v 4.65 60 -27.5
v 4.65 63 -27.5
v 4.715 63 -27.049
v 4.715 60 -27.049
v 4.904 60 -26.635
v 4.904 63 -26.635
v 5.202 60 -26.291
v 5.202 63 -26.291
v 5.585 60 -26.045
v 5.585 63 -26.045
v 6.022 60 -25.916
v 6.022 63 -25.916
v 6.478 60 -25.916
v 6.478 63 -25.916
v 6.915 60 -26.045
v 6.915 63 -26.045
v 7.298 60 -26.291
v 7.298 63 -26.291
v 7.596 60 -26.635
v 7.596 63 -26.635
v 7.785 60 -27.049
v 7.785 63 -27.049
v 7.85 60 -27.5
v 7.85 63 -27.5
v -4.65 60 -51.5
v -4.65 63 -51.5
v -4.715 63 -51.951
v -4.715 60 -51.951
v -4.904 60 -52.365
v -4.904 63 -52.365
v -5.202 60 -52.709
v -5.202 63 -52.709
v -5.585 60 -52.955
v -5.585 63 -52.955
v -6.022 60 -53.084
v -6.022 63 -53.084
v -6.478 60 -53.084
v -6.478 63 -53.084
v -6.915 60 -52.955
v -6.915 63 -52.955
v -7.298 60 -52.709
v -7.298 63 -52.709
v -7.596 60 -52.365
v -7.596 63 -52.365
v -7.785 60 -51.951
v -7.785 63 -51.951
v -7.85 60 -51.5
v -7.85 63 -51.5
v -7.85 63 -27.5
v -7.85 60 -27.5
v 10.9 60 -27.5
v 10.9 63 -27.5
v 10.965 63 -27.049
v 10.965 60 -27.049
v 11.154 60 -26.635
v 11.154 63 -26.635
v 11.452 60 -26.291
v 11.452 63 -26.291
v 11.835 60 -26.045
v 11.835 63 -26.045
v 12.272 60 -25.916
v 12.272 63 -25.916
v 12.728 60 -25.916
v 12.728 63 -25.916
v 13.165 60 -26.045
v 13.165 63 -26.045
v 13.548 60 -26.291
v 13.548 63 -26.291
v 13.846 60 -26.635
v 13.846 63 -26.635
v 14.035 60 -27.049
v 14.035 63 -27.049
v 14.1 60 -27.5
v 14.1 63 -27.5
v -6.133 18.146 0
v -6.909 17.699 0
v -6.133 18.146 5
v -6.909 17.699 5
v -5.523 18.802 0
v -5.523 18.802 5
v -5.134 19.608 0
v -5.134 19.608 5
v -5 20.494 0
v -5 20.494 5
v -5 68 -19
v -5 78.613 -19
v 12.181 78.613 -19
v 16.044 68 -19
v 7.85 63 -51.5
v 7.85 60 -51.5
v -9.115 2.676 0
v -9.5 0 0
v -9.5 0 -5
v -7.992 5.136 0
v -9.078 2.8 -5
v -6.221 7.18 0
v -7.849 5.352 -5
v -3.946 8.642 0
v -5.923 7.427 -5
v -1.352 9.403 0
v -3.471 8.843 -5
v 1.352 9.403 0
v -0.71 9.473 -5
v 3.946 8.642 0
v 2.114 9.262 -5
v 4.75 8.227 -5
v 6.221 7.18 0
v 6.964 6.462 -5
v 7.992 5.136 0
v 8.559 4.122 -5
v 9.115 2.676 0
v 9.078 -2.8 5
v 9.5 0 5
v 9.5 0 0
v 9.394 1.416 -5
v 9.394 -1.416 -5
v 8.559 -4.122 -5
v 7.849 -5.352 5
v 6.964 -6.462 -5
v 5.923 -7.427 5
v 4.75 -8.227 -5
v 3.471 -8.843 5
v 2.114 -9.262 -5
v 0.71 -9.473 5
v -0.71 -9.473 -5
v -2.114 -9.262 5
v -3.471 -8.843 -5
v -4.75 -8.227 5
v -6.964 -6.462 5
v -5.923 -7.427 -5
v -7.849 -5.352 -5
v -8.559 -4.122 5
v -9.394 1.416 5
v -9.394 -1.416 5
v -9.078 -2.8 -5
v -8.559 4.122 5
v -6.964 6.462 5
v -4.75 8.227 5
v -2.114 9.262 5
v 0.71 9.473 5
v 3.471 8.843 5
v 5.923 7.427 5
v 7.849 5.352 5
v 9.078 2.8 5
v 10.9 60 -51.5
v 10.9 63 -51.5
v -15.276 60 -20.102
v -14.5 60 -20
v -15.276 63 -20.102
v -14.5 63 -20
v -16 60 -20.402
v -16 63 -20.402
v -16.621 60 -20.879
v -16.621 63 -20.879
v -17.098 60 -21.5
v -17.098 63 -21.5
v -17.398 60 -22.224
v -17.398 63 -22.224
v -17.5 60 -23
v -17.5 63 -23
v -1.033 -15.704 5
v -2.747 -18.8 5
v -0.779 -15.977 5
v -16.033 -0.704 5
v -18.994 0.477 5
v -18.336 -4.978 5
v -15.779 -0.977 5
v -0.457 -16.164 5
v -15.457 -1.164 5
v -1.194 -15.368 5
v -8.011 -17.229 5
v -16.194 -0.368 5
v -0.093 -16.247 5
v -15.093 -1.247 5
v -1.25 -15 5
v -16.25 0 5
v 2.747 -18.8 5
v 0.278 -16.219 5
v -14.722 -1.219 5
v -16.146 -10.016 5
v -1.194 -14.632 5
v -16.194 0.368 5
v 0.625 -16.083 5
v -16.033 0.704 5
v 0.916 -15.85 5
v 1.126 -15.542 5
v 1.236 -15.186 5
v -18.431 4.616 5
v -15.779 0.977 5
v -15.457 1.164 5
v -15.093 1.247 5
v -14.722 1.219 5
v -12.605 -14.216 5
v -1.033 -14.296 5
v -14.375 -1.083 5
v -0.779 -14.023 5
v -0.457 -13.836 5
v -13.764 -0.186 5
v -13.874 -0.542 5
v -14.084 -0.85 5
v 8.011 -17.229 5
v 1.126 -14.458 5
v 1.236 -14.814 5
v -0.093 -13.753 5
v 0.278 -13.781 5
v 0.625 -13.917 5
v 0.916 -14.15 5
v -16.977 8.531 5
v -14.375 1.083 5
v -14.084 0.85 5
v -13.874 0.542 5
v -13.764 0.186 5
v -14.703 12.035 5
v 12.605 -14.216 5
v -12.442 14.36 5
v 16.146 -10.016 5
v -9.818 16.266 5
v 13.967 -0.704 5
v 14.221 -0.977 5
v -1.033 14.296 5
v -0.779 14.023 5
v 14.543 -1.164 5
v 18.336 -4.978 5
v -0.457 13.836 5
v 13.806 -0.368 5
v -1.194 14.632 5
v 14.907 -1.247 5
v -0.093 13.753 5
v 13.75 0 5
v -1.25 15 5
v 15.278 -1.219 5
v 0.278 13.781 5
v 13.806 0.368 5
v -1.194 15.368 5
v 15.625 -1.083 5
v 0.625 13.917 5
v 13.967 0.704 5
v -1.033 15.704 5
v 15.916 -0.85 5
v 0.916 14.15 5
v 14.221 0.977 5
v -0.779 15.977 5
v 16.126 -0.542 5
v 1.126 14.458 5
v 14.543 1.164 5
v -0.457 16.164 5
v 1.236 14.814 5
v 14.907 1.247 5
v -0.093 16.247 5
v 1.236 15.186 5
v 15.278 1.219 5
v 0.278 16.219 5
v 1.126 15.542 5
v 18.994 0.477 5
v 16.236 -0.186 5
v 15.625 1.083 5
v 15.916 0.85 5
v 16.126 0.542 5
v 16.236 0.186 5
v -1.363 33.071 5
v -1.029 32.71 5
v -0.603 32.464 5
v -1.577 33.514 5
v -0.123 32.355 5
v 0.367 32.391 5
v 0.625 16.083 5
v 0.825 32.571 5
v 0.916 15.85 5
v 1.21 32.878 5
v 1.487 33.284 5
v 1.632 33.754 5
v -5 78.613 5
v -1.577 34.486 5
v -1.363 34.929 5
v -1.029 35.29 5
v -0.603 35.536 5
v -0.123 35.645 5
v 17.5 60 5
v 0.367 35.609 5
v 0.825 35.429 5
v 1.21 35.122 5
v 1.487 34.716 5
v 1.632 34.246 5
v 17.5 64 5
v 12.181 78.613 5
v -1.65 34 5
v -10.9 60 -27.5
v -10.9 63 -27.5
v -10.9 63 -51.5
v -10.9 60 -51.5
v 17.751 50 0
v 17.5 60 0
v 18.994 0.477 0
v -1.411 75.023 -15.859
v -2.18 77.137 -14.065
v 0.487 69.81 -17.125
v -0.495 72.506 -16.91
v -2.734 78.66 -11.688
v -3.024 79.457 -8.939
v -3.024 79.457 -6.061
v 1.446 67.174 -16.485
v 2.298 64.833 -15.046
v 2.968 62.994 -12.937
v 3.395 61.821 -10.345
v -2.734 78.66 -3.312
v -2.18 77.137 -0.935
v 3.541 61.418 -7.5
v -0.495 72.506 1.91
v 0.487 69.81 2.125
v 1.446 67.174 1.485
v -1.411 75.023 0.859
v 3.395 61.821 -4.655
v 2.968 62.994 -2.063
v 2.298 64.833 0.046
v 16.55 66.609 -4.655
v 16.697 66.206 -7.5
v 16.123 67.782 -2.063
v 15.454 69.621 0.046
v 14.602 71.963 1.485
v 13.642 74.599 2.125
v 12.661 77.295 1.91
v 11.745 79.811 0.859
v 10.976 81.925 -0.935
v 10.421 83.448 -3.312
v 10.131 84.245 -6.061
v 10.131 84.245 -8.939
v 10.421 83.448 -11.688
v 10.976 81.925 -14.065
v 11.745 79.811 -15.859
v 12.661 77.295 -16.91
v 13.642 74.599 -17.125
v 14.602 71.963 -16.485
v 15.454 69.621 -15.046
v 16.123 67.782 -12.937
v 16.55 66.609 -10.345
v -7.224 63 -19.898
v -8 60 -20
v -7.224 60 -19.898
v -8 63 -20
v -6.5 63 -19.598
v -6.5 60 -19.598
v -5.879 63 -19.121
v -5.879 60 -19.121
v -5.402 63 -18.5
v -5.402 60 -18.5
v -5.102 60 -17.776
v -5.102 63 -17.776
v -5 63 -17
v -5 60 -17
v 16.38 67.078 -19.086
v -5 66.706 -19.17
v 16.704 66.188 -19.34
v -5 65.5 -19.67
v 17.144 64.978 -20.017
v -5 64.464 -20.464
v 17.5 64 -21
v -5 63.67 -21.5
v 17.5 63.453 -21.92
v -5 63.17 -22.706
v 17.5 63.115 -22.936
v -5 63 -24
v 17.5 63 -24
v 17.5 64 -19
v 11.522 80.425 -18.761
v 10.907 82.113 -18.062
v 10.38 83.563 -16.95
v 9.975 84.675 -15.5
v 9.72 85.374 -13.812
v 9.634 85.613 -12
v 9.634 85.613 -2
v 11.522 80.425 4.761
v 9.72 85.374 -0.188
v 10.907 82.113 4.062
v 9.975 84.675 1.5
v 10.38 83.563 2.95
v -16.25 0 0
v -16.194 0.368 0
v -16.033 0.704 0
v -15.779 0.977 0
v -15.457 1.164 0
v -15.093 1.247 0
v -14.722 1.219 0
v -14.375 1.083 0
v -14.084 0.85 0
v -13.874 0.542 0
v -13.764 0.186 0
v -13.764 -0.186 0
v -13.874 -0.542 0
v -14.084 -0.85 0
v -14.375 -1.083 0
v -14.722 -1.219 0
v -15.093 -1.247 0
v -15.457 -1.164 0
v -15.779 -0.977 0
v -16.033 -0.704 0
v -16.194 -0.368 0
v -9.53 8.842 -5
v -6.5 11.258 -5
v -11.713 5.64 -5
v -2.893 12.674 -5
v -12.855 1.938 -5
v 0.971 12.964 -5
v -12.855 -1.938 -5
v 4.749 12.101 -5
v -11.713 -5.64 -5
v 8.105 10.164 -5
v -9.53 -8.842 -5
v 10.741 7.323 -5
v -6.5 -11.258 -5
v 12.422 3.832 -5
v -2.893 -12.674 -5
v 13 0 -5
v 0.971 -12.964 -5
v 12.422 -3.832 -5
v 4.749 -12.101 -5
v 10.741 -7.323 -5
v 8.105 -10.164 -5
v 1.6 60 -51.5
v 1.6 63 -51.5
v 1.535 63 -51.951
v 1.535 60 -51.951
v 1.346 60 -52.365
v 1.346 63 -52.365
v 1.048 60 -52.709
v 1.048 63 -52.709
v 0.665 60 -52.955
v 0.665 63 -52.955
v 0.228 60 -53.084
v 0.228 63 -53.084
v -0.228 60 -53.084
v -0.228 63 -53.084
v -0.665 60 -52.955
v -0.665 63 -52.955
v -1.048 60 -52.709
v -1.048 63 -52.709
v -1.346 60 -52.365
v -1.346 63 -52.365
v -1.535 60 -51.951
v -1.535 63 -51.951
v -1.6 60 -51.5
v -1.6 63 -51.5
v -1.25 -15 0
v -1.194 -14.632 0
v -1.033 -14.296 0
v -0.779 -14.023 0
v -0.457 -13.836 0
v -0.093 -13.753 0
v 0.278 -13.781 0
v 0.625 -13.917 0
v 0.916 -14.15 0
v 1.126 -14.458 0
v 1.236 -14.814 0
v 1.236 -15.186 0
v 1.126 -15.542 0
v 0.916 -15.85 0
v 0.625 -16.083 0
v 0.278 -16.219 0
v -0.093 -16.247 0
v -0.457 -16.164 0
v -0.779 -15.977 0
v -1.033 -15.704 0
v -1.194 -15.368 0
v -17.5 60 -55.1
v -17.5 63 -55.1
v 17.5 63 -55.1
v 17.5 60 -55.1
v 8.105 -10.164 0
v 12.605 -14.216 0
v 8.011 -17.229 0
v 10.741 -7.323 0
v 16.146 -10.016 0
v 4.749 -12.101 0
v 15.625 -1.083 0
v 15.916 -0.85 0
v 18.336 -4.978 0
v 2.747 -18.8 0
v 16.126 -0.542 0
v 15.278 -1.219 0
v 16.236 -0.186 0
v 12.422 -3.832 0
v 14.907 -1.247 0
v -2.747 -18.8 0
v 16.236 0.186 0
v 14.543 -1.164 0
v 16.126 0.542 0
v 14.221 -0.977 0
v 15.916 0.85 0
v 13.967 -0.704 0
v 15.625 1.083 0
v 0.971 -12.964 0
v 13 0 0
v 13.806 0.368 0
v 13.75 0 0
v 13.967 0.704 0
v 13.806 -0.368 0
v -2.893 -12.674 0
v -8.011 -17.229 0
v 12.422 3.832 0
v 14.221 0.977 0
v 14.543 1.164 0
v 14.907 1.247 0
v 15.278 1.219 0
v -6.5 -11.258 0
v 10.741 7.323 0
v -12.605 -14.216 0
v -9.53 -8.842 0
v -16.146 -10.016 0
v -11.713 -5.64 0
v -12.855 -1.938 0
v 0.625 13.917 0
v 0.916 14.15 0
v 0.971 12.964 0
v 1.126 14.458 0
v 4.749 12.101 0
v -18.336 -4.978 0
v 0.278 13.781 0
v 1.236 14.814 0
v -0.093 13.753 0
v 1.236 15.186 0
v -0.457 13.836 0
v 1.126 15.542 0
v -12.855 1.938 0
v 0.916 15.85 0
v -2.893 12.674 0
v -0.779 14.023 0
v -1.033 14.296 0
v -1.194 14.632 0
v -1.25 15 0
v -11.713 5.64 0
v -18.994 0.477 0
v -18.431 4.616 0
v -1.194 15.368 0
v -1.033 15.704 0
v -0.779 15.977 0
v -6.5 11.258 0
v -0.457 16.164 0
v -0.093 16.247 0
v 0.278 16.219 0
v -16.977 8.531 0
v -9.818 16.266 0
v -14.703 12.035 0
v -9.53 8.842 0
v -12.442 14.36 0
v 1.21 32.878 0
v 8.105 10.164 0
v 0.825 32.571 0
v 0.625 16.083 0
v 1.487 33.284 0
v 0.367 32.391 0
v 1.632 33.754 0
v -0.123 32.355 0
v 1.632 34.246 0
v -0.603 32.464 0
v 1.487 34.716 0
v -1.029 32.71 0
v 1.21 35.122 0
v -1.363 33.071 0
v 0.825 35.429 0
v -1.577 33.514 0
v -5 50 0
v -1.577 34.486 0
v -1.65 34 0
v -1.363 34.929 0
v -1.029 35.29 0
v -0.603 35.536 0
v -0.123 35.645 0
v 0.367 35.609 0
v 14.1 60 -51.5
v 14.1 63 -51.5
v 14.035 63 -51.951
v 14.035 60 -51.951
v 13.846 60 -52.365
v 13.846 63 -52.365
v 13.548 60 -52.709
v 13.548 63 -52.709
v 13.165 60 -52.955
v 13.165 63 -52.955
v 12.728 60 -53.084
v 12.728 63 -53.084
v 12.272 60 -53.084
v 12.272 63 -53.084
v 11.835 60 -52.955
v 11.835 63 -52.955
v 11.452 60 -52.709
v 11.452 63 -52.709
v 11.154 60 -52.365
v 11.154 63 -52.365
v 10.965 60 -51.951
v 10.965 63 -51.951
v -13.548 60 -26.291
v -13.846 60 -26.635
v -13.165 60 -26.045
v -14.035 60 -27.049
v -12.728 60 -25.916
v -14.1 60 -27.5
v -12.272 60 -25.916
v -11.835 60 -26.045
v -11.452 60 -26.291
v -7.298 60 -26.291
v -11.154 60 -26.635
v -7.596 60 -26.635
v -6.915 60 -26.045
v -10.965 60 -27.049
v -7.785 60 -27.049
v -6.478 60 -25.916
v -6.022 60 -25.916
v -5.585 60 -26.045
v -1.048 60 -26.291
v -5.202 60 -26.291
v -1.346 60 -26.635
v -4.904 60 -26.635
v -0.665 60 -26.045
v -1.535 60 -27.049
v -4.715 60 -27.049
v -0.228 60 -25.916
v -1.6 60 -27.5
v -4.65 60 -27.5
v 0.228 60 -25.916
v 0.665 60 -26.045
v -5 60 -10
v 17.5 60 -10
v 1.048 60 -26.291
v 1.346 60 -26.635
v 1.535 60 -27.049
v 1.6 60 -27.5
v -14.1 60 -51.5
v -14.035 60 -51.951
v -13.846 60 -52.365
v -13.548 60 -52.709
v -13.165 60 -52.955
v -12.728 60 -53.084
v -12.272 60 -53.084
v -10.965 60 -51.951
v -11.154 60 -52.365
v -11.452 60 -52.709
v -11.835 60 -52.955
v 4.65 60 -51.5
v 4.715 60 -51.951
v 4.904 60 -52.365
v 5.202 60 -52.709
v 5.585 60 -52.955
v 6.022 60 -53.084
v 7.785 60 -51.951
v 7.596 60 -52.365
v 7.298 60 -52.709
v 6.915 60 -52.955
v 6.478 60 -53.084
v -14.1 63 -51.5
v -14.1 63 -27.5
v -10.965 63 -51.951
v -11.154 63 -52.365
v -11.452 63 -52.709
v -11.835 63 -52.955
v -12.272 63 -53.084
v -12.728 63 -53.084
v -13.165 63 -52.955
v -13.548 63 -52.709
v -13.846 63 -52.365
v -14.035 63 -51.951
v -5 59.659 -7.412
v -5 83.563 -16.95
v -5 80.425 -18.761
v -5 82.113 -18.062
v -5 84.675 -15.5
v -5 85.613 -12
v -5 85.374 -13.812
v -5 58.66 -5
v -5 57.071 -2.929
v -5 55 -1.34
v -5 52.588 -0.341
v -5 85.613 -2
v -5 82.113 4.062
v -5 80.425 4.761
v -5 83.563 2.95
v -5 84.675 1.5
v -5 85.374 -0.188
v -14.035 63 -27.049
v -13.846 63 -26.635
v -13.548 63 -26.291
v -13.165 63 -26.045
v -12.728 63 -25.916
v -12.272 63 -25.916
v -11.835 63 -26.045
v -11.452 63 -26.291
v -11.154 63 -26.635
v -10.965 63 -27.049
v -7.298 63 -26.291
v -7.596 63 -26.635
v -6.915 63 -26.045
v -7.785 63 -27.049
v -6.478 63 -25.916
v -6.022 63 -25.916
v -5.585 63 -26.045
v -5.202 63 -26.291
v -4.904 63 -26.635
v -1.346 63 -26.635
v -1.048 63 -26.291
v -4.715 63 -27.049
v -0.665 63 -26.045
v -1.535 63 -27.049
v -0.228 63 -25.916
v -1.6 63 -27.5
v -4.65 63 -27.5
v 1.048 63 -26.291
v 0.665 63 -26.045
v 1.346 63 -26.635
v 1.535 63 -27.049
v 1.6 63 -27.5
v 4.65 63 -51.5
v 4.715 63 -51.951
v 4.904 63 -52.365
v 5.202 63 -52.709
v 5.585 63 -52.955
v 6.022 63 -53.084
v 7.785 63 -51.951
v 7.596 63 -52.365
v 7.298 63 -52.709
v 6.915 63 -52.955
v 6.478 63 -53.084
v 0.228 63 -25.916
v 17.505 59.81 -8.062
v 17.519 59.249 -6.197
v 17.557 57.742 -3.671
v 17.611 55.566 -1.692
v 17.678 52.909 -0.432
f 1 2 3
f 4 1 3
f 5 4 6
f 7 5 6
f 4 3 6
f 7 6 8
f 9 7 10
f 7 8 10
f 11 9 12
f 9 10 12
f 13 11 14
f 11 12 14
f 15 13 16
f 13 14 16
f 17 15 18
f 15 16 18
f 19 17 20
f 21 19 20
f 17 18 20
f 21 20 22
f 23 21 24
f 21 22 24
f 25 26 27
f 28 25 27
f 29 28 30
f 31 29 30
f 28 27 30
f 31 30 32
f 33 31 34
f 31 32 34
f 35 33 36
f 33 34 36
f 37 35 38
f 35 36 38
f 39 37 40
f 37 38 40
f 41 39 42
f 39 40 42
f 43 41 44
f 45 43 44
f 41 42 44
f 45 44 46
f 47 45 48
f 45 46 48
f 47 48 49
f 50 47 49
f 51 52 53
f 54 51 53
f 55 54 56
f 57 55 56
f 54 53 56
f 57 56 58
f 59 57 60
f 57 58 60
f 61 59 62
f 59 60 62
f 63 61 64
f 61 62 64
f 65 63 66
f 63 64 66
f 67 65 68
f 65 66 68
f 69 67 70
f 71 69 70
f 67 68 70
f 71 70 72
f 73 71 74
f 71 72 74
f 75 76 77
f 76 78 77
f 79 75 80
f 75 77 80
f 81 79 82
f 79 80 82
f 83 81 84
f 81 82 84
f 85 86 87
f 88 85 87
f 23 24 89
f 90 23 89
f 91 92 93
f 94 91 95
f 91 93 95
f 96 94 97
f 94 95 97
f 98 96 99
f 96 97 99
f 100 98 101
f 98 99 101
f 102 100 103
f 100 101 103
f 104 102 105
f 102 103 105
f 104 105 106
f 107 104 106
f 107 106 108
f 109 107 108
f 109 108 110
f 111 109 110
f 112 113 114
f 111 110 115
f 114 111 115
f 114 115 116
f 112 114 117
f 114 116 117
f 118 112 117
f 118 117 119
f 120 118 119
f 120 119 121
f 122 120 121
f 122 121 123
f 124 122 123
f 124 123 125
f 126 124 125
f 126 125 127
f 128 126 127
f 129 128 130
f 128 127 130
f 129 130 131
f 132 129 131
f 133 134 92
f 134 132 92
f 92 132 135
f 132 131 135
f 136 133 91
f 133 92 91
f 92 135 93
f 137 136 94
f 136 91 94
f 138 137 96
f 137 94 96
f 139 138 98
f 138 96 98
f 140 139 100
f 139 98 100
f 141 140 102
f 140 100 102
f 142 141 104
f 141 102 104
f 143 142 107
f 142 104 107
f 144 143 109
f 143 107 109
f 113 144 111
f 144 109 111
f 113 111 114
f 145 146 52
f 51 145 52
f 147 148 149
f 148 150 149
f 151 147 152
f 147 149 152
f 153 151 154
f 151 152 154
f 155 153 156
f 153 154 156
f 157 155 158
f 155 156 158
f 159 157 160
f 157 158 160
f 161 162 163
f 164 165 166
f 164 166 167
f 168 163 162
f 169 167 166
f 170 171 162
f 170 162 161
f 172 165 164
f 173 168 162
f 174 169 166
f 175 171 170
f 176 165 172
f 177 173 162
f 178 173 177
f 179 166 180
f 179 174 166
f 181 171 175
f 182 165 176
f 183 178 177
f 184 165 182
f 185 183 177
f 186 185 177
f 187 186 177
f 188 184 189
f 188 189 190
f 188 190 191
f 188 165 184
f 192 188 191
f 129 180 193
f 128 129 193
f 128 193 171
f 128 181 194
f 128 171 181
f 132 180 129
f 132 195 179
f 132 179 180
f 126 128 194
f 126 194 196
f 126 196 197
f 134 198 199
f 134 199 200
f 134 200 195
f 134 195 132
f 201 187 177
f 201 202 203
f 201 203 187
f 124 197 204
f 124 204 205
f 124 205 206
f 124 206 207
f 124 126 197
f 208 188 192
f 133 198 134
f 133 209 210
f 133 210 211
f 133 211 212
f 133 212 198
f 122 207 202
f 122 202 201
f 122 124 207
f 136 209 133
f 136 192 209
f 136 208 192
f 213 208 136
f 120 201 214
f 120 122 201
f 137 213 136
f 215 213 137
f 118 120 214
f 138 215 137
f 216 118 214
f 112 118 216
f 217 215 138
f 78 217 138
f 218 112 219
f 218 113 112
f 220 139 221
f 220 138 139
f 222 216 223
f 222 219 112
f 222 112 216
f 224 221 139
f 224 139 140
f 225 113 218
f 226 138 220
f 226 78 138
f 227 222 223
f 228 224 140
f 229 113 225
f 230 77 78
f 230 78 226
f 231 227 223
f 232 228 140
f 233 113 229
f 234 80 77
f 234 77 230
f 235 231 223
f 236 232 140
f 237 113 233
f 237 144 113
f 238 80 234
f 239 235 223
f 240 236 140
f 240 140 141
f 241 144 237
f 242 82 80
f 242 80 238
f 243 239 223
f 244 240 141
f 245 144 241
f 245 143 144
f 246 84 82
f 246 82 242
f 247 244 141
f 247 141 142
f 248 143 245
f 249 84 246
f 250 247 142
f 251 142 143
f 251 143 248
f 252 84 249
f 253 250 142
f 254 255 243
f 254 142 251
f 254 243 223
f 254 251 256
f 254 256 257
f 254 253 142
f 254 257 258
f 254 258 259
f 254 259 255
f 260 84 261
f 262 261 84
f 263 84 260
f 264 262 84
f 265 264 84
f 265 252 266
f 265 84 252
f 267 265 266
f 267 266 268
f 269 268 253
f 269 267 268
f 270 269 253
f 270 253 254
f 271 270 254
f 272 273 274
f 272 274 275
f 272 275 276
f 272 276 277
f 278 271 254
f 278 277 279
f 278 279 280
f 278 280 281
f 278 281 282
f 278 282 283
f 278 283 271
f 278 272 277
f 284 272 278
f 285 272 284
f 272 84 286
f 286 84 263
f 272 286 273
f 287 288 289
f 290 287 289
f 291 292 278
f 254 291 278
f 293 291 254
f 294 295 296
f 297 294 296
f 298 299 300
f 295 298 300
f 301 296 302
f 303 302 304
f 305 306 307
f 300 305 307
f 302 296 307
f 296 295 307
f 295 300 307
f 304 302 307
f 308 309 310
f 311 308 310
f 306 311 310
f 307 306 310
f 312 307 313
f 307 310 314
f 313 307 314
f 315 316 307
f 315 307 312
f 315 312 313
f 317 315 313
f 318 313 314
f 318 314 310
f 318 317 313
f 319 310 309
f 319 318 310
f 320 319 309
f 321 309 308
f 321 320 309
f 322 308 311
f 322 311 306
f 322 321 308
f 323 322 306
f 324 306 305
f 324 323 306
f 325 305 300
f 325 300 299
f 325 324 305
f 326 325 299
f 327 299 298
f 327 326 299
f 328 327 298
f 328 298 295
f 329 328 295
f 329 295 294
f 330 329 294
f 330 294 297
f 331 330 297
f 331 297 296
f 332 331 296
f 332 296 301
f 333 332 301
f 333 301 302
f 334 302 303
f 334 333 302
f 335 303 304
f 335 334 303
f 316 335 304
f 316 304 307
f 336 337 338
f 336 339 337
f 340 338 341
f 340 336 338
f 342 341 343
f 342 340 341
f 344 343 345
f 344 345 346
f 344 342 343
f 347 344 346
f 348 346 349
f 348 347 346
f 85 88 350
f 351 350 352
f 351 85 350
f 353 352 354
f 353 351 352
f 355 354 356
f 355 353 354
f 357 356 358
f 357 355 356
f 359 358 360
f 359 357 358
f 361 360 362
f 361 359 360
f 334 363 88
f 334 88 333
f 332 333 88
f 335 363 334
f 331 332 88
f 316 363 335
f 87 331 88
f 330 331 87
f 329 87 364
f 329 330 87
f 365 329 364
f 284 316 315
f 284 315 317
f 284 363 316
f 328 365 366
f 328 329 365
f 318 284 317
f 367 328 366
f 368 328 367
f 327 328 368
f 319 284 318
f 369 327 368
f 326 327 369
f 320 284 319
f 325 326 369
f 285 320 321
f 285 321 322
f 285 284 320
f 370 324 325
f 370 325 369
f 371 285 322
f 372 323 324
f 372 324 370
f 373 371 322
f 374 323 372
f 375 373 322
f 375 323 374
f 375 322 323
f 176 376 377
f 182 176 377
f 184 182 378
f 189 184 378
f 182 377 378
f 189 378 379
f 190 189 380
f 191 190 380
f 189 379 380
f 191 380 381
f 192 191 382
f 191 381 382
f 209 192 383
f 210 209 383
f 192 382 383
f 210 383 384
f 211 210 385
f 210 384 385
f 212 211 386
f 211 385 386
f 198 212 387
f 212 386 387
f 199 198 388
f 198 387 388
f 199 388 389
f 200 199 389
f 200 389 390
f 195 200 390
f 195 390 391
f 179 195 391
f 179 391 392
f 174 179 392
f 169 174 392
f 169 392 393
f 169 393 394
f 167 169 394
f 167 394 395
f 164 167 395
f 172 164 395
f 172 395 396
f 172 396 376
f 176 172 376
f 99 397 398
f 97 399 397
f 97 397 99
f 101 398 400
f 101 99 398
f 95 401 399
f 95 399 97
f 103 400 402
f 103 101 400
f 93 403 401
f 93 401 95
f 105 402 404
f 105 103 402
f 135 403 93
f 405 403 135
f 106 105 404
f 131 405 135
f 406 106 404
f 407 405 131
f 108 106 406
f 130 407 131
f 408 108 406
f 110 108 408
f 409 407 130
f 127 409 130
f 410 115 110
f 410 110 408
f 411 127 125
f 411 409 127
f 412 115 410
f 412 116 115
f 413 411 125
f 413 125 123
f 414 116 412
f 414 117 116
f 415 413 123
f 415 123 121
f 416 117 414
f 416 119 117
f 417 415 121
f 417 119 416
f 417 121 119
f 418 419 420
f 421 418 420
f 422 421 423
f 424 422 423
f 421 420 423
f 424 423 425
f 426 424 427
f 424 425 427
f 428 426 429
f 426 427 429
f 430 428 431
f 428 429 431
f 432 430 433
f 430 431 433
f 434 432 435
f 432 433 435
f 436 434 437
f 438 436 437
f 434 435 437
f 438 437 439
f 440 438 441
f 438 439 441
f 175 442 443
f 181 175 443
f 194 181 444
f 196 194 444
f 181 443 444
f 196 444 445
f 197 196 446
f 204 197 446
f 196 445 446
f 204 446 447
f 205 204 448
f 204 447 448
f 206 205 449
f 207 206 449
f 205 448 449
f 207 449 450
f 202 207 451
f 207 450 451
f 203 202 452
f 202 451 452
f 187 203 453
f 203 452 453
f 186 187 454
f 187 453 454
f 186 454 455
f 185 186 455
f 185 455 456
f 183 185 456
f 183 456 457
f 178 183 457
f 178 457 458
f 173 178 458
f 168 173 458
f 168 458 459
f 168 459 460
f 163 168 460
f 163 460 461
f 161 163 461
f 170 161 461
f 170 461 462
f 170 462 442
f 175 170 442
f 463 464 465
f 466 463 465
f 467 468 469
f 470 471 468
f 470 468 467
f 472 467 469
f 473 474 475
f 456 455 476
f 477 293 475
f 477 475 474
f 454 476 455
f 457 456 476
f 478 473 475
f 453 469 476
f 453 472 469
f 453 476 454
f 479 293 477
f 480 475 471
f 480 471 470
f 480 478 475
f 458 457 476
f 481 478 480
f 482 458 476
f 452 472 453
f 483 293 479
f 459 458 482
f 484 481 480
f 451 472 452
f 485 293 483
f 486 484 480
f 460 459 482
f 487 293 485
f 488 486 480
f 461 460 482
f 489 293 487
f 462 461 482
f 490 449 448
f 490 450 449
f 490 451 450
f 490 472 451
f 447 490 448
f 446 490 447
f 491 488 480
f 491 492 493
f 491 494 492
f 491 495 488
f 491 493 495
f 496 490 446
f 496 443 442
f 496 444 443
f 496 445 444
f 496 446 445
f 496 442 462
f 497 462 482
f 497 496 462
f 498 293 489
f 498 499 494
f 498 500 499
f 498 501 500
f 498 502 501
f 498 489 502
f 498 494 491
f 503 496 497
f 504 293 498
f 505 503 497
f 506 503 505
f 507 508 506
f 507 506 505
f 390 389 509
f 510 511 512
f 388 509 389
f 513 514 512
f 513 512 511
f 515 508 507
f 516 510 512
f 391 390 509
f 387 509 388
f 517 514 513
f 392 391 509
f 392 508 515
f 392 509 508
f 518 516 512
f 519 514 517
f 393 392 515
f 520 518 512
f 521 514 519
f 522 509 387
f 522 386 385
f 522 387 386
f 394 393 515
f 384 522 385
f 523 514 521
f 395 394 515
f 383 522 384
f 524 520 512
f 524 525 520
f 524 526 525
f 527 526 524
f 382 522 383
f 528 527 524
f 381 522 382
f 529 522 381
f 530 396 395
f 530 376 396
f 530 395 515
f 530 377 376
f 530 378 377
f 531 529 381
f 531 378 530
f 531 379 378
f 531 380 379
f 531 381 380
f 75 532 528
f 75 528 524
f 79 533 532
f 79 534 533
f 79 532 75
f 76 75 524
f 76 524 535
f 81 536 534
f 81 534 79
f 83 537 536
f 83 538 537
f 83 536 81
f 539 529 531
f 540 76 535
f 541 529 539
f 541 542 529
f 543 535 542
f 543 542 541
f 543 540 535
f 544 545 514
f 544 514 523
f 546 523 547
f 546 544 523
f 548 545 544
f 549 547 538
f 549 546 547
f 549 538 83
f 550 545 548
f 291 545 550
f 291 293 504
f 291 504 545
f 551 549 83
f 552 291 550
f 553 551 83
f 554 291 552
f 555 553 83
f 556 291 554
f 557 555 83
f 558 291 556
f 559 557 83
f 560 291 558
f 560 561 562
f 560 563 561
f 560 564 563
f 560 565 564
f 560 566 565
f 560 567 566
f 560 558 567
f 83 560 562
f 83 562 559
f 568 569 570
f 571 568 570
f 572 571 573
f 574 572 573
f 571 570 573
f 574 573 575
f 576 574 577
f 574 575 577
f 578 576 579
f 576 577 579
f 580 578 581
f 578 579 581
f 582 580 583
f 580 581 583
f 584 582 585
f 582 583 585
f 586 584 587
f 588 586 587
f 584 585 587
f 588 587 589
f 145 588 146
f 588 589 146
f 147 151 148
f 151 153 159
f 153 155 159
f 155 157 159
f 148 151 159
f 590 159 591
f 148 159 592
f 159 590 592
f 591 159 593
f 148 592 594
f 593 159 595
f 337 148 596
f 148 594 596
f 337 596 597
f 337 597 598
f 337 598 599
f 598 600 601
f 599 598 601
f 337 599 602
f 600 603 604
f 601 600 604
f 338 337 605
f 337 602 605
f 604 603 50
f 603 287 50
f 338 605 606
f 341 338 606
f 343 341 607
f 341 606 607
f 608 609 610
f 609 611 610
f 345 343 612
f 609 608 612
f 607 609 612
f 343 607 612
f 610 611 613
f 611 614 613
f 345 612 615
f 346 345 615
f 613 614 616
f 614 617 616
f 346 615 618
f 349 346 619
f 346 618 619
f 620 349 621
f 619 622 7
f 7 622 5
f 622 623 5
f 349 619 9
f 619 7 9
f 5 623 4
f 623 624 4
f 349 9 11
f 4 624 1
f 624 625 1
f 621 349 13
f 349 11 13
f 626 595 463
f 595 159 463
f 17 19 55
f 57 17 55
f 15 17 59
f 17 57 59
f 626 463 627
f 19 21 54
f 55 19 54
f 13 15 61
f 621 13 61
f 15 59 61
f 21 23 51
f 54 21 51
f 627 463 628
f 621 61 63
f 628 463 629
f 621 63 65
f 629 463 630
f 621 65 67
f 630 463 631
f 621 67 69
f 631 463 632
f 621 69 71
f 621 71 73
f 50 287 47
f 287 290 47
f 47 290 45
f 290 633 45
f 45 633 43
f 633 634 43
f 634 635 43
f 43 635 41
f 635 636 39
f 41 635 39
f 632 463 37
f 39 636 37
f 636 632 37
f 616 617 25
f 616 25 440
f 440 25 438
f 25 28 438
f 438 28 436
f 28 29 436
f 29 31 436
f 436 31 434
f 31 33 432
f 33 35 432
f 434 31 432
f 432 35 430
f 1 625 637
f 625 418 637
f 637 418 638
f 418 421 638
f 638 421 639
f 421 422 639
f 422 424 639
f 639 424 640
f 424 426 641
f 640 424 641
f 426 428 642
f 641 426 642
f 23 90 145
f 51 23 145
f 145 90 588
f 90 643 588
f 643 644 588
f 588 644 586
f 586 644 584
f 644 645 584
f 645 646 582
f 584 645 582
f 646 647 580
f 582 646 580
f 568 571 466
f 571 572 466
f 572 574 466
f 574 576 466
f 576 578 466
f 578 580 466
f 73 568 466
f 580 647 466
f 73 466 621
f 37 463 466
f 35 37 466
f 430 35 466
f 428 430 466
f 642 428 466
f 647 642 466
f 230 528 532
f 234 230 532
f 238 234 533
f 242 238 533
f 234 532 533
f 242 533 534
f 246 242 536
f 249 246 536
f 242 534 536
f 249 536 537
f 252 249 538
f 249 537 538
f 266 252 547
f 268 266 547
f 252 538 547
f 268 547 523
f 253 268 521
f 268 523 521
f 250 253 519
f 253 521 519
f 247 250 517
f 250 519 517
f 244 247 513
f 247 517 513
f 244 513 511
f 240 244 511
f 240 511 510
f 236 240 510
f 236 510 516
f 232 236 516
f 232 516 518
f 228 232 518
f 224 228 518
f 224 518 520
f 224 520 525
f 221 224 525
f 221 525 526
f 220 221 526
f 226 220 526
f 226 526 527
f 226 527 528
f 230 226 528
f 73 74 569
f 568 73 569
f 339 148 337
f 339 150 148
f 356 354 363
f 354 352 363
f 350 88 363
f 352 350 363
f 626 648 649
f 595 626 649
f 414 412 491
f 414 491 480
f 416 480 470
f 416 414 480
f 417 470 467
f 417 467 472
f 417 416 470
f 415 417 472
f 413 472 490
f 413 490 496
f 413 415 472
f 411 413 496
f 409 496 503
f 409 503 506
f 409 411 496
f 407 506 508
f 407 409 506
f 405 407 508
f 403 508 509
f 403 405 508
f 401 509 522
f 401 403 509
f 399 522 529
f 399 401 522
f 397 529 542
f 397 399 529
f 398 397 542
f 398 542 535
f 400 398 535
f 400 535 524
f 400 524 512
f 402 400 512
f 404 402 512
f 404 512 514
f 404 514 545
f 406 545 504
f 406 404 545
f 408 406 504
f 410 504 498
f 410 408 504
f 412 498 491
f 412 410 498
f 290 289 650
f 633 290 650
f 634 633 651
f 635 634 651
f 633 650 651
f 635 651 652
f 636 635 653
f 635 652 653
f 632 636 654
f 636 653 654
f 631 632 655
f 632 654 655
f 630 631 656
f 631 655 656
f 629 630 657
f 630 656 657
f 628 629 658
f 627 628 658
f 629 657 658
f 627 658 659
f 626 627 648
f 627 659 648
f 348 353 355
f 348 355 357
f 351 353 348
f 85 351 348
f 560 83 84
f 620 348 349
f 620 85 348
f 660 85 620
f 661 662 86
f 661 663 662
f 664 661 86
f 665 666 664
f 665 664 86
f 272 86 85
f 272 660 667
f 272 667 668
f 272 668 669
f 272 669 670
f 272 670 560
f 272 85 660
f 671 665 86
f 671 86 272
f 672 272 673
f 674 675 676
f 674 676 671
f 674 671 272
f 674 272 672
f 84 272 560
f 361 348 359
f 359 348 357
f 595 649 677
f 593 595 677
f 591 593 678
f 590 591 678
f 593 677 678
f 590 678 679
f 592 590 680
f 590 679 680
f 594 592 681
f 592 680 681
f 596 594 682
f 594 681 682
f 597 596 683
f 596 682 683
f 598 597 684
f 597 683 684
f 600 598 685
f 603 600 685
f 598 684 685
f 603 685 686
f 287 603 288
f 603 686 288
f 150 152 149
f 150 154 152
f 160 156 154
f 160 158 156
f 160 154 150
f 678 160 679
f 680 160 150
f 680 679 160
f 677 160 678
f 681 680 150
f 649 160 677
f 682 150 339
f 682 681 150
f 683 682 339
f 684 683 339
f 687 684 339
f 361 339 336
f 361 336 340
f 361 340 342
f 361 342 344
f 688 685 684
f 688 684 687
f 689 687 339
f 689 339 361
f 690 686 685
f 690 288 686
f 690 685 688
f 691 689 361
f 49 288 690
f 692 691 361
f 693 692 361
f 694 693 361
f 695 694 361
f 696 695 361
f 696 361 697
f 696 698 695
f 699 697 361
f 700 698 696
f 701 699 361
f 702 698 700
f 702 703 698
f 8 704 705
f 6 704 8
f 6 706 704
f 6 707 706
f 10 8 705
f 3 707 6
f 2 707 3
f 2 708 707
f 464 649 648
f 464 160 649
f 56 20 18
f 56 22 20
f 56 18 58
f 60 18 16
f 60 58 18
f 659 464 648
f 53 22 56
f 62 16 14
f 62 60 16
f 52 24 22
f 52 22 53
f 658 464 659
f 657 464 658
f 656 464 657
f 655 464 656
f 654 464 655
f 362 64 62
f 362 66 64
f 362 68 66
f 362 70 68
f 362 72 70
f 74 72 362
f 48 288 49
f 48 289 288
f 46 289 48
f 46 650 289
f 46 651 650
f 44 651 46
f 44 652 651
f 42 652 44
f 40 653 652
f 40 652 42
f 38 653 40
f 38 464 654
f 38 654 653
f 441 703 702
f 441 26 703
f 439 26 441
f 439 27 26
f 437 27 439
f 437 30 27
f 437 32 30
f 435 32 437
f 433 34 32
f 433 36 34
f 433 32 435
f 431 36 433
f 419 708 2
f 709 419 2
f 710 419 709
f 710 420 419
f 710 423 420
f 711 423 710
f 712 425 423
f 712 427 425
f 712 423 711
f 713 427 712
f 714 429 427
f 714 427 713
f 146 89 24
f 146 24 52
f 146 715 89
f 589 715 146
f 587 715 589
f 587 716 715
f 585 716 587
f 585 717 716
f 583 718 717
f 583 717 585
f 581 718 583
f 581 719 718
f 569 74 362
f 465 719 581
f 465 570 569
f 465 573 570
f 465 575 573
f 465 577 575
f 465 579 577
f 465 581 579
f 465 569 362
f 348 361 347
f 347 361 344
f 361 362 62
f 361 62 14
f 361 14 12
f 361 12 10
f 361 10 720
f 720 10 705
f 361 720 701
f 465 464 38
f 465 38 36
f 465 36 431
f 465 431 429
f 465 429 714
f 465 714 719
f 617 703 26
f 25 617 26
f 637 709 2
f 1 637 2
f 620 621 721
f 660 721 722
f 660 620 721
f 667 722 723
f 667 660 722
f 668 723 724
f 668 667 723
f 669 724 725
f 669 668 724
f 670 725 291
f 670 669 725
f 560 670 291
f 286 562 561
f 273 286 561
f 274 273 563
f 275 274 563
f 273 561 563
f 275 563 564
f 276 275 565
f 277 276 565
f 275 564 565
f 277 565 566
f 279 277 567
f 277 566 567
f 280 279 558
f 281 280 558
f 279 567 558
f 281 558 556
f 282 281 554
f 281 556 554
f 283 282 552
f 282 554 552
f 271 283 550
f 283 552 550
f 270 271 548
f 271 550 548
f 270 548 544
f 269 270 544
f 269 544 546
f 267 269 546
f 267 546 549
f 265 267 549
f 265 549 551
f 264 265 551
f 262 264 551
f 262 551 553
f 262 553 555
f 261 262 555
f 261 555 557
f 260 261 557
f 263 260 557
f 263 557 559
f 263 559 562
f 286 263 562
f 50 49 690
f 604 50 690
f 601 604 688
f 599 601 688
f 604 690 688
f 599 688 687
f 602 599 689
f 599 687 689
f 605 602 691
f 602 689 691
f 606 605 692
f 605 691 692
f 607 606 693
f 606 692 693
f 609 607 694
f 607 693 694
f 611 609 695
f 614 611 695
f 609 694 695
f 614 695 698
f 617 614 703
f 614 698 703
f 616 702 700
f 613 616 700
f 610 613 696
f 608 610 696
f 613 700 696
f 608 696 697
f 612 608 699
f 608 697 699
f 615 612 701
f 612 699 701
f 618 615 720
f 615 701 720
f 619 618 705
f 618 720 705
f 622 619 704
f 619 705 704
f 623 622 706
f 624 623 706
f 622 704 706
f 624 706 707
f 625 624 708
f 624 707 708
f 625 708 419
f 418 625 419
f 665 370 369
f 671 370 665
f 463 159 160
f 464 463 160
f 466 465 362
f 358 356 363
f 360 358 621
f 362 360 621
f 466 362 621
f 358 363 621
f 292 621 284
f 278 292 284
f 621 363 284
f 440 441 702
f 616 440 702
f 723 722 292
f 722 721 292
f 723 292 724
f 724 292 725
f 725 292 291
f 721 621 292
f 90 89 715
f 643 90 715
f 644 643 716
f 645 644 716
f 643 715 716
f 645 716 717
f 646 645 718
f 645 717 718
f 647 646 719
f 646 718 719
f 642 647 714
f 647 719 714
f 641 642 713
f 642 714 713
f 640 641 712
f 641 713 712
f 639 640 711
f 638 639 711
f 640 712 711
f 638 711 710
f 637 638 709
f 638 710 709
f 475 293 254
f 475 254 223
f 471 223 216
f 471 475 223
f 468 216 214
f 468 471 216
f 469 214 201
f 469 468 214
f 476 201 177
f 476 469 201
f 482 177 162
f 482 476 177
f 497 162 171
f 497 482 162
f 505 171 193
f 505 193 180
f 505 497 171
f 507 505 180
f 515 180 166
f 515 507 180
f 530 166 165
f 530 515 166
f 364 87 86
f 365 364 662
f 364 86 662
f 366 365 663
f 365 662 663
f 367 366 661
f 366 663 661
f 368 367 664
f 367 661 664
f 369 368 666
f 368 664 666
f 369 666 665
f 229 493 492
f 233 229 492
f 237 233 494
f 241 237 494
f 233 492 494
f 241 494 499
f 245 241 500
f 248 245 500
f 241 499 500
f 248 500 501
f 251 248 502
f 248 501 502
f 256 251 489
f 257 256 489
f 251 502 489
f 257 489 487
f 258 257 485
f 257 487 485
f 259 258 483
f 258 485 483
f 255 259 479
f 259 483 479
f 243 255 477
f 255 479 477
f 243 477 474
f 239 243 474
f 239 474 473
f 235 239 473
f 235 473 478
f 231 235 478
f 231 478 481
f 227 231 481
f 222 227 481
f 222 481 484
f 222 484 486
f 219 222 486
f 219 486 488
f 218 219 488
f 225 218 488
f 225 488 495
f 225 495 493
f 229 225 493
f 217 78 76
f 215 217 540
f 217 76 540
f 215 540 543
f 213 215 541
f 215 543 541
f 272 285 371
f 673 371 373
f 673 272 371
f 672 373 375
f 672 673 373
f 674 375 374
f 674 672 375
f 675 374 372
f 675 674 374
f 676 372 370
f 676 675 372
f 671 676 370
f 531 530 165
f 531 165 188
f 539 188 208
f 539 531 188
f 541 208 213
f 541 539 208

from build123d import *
from build123d.topology import SkipClean

# Parameters (mm, degrees)
SKETCH2_R                 = 9.5
BOSS_EXTRUDE1_DEPTH       = 5
SKETCH3_W                 = 35
SKETCH3_H                 = 85.128
BOSS_EXTRUDE2_DEPTH       = 3
BOSS_EXTRUDE3_START       = 5
SKETCH4_R                 = 13
SKETCH4_R_2               = 9.5
BOSS_EXTRUDE3_DEPTH       = 5
SKETCH5_W                 = 35
SKETCH5_H                 = 9
BOSS_EXTRUDE4_DEPTH       = 3
M3X0_5_TAPPED_HOLE1_D     = 2.5
M3X0_5_TAPPED_HOLE1_DEPTH = 3
BOSS_EXTRUDE5_DEPTH       = 24
SKETCH11_R                = 9.652
CUT_EXTRUDE1_DEPTH        = 14
CUT_EXTRUDE2_START        = -5
CUT_EXTRUDE2_DEPTH        = 5
CUT_EXTRUDE4_DEPTH        = 3
SKETCH15_W                = 35
SKETCH15_H                = 25.028
CUT_EXTRUDE5_DEPTH        = 12
M3X0_5_TAPPED_HOLE2_D     = 2.5
M3X0_5_TAPPED_HOLE2_DEPTH = 6.5
M3X0_5_TAPPED_HOLE2_TIP   = 0.751075774
FILLET7_R                 = 7
BOSS_EXTRUDE6_START       = -5
BOSS_EXTRUDE6_DEPTH       = 5
FILLET3_R                 = 5
CUT_EXTRUDE6_START        = -25
CUT_EXTRUDE6_DEPTH        = 25
FILLET5_R                 = 10
FILLET4_R                 = 3
M4X0_7_TAPPED_HOLE1_D     = 3.3


with BuildPart() as part:
    # Sketch2 → Boss-Extrude1 (new body)
    with BuildSketch(Plane.XY):
        with BuildLine():
            Line((-18.994017858, 0.476744791), (-17.5, 60))
            Line((-17.5, 60), (17.5, 60))
            Line((17.5, 60), (18.994017858, 0.476744791))
            ThreePointArc((18.994017858, 0.476744791), (0, -19), (-18.994017858, 0.476744791))
        make_face()
        Circle(SKETCH2_R, mode=Mode.SUBTRACT)
    extrude(amount=BOSS_EXTRUDE1_DEPTH)

    # Sketch3 → Boss-Extrude2 (add)
    with BuildSketch(Plane(origin=(0, 60, 0), x_dir=(1, 0, 0), z_dir=(0, 1, 0))):
        with Locations((0, 37.564)):
            Rectangle(SKETCH3_W, SKETCH3_H)
    extrude(amount=BOSS_EXTRUDE2_DEPTH)

    # Sketch4 → Boss-Extrude3 (add)
    with SkipClean():  # the faces are left unmerged after this step: merging them gives an invalid solid
        with BuildSketch(Plane(origin=(0, 0, 0), x_dir=(-1, 0, 0), z_dir=(0, 0, -1)).offset(BOSS_EXTRUDE3_START)):
            with Locations(Location((0, 0, 0), (0, 0, 180))):
                Circle(SKETCH4_R)
            Circle(SKETCH4_R_2, mode=Mode.SUBTRACT)
        extrude(amount=-BOSS_EXTRUDE3_DEPTH)

    # Sketch5 → Boss-Extrude4 (add)
    with SkipClean():  # the faces are left unmerged after this step: merging them gives an invalid solid
        with BuildSketch(Plane(origin=(0, 0, -80.128), x_dir=(-1, 0, 0), z_dir=(0, 0, -1))):
            with Locations((0, 55.5)):
                Rectangle(SKETCH5_W, SKETCH5_H)
        extrude(amount=-BOSS_EXTRUDE4_DEPTH)

    # M3x0.5 Tapped Hole1
    with Locations(Plane(origin=(0, 0, -80.128), x_dir=(1, 0, 0), z_dir=(0, 0, -1))):
        with Locations((12, -55.5), (0, -55.5), (-12, -55.5)):
            Hole(M3X0_5_TAPPED_HOLE1_D / 2, depth=M3X0_5_TAPPED_HOLE1_DEPTH)

    # Sketch10 → Boss-Extrude5 (add)
    with SkipClean():  # the faces are left unmerged after this step: merging them gives an invalid solid
        with BuildSketch(Plane.XY.offset(5)):
            Polygon((-5, 85.612930278), (-5, 63), (17.5, 63), (17.5, 64), (9.633536704, 85.612930278), align=None)
        extrude(amount=-BOSS_EXTRUDE5_DEPTH)

    # Sketch11 → Cut-Extrude1 (cut)
    with SkipClean():  # the faces are left unmerged after this step: merging them gives an invalid solid
        with BuildSketch(Plane(origin=(-1.821352029, 117.084978414, 0), x_dir=(0, 0, -1), z_dir=(-0.9396926207859069, -0.34202014332567293, 0))):
            with Locations(Location((7.5, 44.49185408, 0), (0, 0, 90))):
                Circle(SKETCH11_R)
        extrude(amount=CUT_EXTRUDE1_DEPTH, mode=Mode.SUBTRACT)

    # Sketch12 → Cut-Extrude2 (cut)
    with SkipClean():  # the faces are left unmerged after this step: merging them gives an invalid solid
        with BuildSketch(Plane.XY.offset(5).offset(CUT_EXTRUDE2_START)):
            with BuildLine():
                Line((-13.548939673, 58), (13.548939673, 58))
                Line((13.548939673, 58), (14.702658736, 12.034609511))
                ThreePointArc((14.702658736, 12.034609511), (0, 19), (-14.702658736, 12.034609511))
                Line((-14.702658736, 12.034609511), (-13.548939673, 58))
            make_face()
        extrude(amount=CUT_EXTRUDE2_DEPTH, mode=Mode.SUBTRACT)

    # Sketch14 → Cut-Extrude4 (cut)
    with SkipClean():  # the faces are left unmerged after this step: merging them gives an invalid solid
        with BuildSketch(Plane(origin=(0, 63, 0), x_dir=(1, 0, 0), z_dir=(0, 1, 0))):
            with BuildLine():
                Line((-14.1, 51.5), (-14.1, 27.5))
                ThreePointArc((-14.1, 27.5), (-12.5, 25.9), (-10.9, 27.5))
                Line((-10.9, 27.5), (-10.9, 51.5))
                ThreePointArc((-10.9, 51.5), (-12.5, 53.1), (-14.1, 51.5))
            make_face()
            with BuildLine():
                Line((-1.6, 51.5), (-1.6, 27.5))
                ThreePointArc((-1.6, 27.5), (0, 25.9), (1.6, 27.5))
                Line((1.6, 27.5), (1.6, 51.5))
                ThreePointArc((1.6, 51.5), (0, 53.1), (-1.6, 51.5))
            make_face()
            with BuildLine():
                Line((10.9, 51.5), (10.9, 27.5))
                ThreePointArc((10.9, 27.5), (12.5, 25.9), (14.1, 27.5))
                Line((14.1, 27.5), (14.1, 51.5))
                ThreePointArc((14.1, 51.5), (12.5, 53.1), (10.9, 51.5))
            make_face()
            with BuildLine():
                Line((-7.85, 51.5), (-7.85, 27.5))
                ThreePointArc((-7.85, 27.5), (-6.25, 25.9), (-4.65, 27.5))
                Line((-4.65, 27.5), (-4.65, 51.5))
                ThreePointArc((-4.65, 51.5), (-6.25, 53.1), (-7.85, 51.5))
            make_face()
            with BuildLine():
                Line((4.65, 51.5), (4.65, 27.5))
                ThreePointArc((4.65, 27.5), (6.25, 25.9), (7.85, 27.5))
                Line((7.85, 27.5), (7.85, 51.5))
                ThreePointArc((7.85, 51.5), (6.25, 53.1), (4.65, 51.5))
            make_face()
        extrude(amount=-CUT_EXTRUDE4_DEPTH, mode=Mode.SUBTRACT)

    # Sketch15 → Cut-Extrude5 (cut)
    with SkipClean():  # the faces are left unmerged after this step: merging them gives an invalid solid
        with BuildSketch(Plane(origin=(0, 63, 0), x_dir=(1, 0, 0), z_dir=(0, 1, 0))):
            with Locations((0, 67.614)):
                Rectangle(SKETCH15_W, SKETCH15_H)
        extrude(amount=-CUT_EXTRUDE5_DEPTH, mode=Mode.SUBTRACT)

    # M3x0.5 Tapped Hole2
    with Locations(Plane.XY.offset(5)):
        with Locations((0, 15), (15, 0), (0, -15), (-15, 0)):
            Hole(M3X0_5_TAPPED_HOLE2_D / 2, depth=M3X0_5_TAPPED_HOLE2_DEPTH)
            with Locations((0, 0, -(M3X0_5_TAPPED_HOLE2_DEPTH + M3X0_5_TAPPED_HOLE2_TIP / 2))):  # 118° drill point
                Cone(0, M3X0_5_TAPPED_HOLE2_D / 2, M3X0_5_TAPPED_HOLE2_TIP, mode=Mode.SUBTRACT)

    # Fillet7
    fillet7_edges = [part.edges().sort_by_distance(p)[0] for p in [
        (2.316768352, 85.612930278, 5),
        (2.316768352, 85.612930278, -19),
    ]]
    fillet(fillet7_edges, radius=FILLET7_R)

    # Sketch22 → Boss-Extrude6 (add)
    with SkipClean():  # the faces are left unmerged after this step: merging them gives an invalid solid
        with BuildSketch(Plane.XY.offset(5).offset(BOSS_EXTRUDE6_START)):
            with BuildLine():
                Line((-5, 58), (-5, 18.33030278))
                ThreePointArc((-5, 18.33030278), (5.783107735, 18.098498969), (14.702658736, 12.034609511))
                Line((14.702658736, 12.034609511), (13.548939673, 58))
                Line((13.548939673, 58), (-5, 58))
            make_face()
        extrude(amount=BOSS_EXTRUDE6_DEPTH)

    # Fillet3
    # the kernel refuses this fillet: 5 mm, written as the material it adds along each edge
    with BuildSketch(Plane(origin=(-5, 63, -19), x_dir=(0, 1, 0), z_dir=(1, 0, 0))) as fillet3_piece_1_section:
        with BuildLine():
            CenterArc((FILLET3_R, -FILLET3_R), FILLET3_R, 90, 90)
            Line((0, -FILLET3_R), (0, 0))
            Line((0, 0), (FILLET3_R, 0))
        make_face()
    fillet3_piece_1 = extrude(amount=22.5, mode=Mode.PRIVATE)
    fillet3_piece_1 = split(fillet3_piece_1, bisect_by=Plane(origin=(16.135828419, 67.748030616, -20.138902613), z_dir=(-0.9396926207859069, -0.34202014332567293, 0)), keep=Keep.TOP, mode=Mode.PRIVATE)
    add(fillet3_piece_1)

    # Sketch25 → Cut-Extrude6 (cut)
    with SkipClean():  # the faces are left unmerged after this step: merging them gives an invalid solid
        with BuildSketch(Plane.XY.offset(5).offset(CUT_EXTRUDE6_START)):
            with BuildLine():
                Line((-5, 63), (-17.5, 63))
                Line((-17.5, 63), (-18.994017858, 0.476744791))
                ThreePointArc((-18.994017858, 0.476744791), (-14.953782346, 11.721108887), (-5, 18.33030278))
                Line((-5, 18.33030278), (-5, 63))
            make_face()
        extrude(amount=CUT_EXTRUDE6_DEPTH, mode=Mode.SUBTRACT)

    # Fillet5
    # the kernel refuses this fillet: 10 mm, written as the material it adds along each edge
    with BuildSketch(Plane(origin=(-5, 60, 0), x_dir=(0, 0, -1), z_dir=(1, 0, 0))) as fillet5_piece_1:
        with BuildLine():
            CenterArc((FILLET5_R, -FILLET5_R), FILLET5_R, 90, 90)
            Line((0, -FILLET5_R), (0, 0))
            Line((0, 0), (FILLET5_R, 0))
        make_face()
    extrude(amount=22.5)
    with BuildSketch(Plane(origin=(-5, 60, 0), x_dir=(0, 0, -1), z_dir=(1, 0, 0))) as fillet5_piece_2_section:
        with BuildLine():
            CenterArc((FILLET5_R, -FILLET5_R), FILLET5_R, 90, 90)
            Line((0, -FILLET5_R), (0, 0))
            Line((0, 0), (FILLET5_R, 0))
        make_face()
    fillet5_piece_2 = extrude(amount=47.5, mode=Mode.PRIVATE)
    fillet5_piece_2 = split(fillet5_piece_2, bisect_by=Plane(origin=(17.5, 55.698819483, -1.064725127), z_dir=(1, 0, 0)), keep=Keep.TOP, mode=Mode.PRIVATE)
    fillet5_piece_2 = split(fillet5_piece_2, bisect_by=Plane(origin=(17.607924501, 55.700173495, -1.064725127), z_dir=(-0.9996851504403609, -0.0250918311215615, 0)), keep=Keep.TOP, mode=Mode.PRIVATE)
    add(fillet5_piece_2)

    # Fillet4
    fillet4_edges = [part.edges().sort_by_distance(p)[0] for p in [
        (-5, 18.33030278, 2.5),
        (-17.5, 61.5, -20),
        (-5, 61.5, -20),
    ]]
    fillet(fillet4_edges, radius=FILLET4_R)

    # M4x0.7 Tapped Hole1 (through all)
    with Locations(Plane.XY.offset(5)):
        with Locations((0, 34)):
            Hole(M4X0_7_TAPPED_HOLE1_D / 2)


solid = part.part
